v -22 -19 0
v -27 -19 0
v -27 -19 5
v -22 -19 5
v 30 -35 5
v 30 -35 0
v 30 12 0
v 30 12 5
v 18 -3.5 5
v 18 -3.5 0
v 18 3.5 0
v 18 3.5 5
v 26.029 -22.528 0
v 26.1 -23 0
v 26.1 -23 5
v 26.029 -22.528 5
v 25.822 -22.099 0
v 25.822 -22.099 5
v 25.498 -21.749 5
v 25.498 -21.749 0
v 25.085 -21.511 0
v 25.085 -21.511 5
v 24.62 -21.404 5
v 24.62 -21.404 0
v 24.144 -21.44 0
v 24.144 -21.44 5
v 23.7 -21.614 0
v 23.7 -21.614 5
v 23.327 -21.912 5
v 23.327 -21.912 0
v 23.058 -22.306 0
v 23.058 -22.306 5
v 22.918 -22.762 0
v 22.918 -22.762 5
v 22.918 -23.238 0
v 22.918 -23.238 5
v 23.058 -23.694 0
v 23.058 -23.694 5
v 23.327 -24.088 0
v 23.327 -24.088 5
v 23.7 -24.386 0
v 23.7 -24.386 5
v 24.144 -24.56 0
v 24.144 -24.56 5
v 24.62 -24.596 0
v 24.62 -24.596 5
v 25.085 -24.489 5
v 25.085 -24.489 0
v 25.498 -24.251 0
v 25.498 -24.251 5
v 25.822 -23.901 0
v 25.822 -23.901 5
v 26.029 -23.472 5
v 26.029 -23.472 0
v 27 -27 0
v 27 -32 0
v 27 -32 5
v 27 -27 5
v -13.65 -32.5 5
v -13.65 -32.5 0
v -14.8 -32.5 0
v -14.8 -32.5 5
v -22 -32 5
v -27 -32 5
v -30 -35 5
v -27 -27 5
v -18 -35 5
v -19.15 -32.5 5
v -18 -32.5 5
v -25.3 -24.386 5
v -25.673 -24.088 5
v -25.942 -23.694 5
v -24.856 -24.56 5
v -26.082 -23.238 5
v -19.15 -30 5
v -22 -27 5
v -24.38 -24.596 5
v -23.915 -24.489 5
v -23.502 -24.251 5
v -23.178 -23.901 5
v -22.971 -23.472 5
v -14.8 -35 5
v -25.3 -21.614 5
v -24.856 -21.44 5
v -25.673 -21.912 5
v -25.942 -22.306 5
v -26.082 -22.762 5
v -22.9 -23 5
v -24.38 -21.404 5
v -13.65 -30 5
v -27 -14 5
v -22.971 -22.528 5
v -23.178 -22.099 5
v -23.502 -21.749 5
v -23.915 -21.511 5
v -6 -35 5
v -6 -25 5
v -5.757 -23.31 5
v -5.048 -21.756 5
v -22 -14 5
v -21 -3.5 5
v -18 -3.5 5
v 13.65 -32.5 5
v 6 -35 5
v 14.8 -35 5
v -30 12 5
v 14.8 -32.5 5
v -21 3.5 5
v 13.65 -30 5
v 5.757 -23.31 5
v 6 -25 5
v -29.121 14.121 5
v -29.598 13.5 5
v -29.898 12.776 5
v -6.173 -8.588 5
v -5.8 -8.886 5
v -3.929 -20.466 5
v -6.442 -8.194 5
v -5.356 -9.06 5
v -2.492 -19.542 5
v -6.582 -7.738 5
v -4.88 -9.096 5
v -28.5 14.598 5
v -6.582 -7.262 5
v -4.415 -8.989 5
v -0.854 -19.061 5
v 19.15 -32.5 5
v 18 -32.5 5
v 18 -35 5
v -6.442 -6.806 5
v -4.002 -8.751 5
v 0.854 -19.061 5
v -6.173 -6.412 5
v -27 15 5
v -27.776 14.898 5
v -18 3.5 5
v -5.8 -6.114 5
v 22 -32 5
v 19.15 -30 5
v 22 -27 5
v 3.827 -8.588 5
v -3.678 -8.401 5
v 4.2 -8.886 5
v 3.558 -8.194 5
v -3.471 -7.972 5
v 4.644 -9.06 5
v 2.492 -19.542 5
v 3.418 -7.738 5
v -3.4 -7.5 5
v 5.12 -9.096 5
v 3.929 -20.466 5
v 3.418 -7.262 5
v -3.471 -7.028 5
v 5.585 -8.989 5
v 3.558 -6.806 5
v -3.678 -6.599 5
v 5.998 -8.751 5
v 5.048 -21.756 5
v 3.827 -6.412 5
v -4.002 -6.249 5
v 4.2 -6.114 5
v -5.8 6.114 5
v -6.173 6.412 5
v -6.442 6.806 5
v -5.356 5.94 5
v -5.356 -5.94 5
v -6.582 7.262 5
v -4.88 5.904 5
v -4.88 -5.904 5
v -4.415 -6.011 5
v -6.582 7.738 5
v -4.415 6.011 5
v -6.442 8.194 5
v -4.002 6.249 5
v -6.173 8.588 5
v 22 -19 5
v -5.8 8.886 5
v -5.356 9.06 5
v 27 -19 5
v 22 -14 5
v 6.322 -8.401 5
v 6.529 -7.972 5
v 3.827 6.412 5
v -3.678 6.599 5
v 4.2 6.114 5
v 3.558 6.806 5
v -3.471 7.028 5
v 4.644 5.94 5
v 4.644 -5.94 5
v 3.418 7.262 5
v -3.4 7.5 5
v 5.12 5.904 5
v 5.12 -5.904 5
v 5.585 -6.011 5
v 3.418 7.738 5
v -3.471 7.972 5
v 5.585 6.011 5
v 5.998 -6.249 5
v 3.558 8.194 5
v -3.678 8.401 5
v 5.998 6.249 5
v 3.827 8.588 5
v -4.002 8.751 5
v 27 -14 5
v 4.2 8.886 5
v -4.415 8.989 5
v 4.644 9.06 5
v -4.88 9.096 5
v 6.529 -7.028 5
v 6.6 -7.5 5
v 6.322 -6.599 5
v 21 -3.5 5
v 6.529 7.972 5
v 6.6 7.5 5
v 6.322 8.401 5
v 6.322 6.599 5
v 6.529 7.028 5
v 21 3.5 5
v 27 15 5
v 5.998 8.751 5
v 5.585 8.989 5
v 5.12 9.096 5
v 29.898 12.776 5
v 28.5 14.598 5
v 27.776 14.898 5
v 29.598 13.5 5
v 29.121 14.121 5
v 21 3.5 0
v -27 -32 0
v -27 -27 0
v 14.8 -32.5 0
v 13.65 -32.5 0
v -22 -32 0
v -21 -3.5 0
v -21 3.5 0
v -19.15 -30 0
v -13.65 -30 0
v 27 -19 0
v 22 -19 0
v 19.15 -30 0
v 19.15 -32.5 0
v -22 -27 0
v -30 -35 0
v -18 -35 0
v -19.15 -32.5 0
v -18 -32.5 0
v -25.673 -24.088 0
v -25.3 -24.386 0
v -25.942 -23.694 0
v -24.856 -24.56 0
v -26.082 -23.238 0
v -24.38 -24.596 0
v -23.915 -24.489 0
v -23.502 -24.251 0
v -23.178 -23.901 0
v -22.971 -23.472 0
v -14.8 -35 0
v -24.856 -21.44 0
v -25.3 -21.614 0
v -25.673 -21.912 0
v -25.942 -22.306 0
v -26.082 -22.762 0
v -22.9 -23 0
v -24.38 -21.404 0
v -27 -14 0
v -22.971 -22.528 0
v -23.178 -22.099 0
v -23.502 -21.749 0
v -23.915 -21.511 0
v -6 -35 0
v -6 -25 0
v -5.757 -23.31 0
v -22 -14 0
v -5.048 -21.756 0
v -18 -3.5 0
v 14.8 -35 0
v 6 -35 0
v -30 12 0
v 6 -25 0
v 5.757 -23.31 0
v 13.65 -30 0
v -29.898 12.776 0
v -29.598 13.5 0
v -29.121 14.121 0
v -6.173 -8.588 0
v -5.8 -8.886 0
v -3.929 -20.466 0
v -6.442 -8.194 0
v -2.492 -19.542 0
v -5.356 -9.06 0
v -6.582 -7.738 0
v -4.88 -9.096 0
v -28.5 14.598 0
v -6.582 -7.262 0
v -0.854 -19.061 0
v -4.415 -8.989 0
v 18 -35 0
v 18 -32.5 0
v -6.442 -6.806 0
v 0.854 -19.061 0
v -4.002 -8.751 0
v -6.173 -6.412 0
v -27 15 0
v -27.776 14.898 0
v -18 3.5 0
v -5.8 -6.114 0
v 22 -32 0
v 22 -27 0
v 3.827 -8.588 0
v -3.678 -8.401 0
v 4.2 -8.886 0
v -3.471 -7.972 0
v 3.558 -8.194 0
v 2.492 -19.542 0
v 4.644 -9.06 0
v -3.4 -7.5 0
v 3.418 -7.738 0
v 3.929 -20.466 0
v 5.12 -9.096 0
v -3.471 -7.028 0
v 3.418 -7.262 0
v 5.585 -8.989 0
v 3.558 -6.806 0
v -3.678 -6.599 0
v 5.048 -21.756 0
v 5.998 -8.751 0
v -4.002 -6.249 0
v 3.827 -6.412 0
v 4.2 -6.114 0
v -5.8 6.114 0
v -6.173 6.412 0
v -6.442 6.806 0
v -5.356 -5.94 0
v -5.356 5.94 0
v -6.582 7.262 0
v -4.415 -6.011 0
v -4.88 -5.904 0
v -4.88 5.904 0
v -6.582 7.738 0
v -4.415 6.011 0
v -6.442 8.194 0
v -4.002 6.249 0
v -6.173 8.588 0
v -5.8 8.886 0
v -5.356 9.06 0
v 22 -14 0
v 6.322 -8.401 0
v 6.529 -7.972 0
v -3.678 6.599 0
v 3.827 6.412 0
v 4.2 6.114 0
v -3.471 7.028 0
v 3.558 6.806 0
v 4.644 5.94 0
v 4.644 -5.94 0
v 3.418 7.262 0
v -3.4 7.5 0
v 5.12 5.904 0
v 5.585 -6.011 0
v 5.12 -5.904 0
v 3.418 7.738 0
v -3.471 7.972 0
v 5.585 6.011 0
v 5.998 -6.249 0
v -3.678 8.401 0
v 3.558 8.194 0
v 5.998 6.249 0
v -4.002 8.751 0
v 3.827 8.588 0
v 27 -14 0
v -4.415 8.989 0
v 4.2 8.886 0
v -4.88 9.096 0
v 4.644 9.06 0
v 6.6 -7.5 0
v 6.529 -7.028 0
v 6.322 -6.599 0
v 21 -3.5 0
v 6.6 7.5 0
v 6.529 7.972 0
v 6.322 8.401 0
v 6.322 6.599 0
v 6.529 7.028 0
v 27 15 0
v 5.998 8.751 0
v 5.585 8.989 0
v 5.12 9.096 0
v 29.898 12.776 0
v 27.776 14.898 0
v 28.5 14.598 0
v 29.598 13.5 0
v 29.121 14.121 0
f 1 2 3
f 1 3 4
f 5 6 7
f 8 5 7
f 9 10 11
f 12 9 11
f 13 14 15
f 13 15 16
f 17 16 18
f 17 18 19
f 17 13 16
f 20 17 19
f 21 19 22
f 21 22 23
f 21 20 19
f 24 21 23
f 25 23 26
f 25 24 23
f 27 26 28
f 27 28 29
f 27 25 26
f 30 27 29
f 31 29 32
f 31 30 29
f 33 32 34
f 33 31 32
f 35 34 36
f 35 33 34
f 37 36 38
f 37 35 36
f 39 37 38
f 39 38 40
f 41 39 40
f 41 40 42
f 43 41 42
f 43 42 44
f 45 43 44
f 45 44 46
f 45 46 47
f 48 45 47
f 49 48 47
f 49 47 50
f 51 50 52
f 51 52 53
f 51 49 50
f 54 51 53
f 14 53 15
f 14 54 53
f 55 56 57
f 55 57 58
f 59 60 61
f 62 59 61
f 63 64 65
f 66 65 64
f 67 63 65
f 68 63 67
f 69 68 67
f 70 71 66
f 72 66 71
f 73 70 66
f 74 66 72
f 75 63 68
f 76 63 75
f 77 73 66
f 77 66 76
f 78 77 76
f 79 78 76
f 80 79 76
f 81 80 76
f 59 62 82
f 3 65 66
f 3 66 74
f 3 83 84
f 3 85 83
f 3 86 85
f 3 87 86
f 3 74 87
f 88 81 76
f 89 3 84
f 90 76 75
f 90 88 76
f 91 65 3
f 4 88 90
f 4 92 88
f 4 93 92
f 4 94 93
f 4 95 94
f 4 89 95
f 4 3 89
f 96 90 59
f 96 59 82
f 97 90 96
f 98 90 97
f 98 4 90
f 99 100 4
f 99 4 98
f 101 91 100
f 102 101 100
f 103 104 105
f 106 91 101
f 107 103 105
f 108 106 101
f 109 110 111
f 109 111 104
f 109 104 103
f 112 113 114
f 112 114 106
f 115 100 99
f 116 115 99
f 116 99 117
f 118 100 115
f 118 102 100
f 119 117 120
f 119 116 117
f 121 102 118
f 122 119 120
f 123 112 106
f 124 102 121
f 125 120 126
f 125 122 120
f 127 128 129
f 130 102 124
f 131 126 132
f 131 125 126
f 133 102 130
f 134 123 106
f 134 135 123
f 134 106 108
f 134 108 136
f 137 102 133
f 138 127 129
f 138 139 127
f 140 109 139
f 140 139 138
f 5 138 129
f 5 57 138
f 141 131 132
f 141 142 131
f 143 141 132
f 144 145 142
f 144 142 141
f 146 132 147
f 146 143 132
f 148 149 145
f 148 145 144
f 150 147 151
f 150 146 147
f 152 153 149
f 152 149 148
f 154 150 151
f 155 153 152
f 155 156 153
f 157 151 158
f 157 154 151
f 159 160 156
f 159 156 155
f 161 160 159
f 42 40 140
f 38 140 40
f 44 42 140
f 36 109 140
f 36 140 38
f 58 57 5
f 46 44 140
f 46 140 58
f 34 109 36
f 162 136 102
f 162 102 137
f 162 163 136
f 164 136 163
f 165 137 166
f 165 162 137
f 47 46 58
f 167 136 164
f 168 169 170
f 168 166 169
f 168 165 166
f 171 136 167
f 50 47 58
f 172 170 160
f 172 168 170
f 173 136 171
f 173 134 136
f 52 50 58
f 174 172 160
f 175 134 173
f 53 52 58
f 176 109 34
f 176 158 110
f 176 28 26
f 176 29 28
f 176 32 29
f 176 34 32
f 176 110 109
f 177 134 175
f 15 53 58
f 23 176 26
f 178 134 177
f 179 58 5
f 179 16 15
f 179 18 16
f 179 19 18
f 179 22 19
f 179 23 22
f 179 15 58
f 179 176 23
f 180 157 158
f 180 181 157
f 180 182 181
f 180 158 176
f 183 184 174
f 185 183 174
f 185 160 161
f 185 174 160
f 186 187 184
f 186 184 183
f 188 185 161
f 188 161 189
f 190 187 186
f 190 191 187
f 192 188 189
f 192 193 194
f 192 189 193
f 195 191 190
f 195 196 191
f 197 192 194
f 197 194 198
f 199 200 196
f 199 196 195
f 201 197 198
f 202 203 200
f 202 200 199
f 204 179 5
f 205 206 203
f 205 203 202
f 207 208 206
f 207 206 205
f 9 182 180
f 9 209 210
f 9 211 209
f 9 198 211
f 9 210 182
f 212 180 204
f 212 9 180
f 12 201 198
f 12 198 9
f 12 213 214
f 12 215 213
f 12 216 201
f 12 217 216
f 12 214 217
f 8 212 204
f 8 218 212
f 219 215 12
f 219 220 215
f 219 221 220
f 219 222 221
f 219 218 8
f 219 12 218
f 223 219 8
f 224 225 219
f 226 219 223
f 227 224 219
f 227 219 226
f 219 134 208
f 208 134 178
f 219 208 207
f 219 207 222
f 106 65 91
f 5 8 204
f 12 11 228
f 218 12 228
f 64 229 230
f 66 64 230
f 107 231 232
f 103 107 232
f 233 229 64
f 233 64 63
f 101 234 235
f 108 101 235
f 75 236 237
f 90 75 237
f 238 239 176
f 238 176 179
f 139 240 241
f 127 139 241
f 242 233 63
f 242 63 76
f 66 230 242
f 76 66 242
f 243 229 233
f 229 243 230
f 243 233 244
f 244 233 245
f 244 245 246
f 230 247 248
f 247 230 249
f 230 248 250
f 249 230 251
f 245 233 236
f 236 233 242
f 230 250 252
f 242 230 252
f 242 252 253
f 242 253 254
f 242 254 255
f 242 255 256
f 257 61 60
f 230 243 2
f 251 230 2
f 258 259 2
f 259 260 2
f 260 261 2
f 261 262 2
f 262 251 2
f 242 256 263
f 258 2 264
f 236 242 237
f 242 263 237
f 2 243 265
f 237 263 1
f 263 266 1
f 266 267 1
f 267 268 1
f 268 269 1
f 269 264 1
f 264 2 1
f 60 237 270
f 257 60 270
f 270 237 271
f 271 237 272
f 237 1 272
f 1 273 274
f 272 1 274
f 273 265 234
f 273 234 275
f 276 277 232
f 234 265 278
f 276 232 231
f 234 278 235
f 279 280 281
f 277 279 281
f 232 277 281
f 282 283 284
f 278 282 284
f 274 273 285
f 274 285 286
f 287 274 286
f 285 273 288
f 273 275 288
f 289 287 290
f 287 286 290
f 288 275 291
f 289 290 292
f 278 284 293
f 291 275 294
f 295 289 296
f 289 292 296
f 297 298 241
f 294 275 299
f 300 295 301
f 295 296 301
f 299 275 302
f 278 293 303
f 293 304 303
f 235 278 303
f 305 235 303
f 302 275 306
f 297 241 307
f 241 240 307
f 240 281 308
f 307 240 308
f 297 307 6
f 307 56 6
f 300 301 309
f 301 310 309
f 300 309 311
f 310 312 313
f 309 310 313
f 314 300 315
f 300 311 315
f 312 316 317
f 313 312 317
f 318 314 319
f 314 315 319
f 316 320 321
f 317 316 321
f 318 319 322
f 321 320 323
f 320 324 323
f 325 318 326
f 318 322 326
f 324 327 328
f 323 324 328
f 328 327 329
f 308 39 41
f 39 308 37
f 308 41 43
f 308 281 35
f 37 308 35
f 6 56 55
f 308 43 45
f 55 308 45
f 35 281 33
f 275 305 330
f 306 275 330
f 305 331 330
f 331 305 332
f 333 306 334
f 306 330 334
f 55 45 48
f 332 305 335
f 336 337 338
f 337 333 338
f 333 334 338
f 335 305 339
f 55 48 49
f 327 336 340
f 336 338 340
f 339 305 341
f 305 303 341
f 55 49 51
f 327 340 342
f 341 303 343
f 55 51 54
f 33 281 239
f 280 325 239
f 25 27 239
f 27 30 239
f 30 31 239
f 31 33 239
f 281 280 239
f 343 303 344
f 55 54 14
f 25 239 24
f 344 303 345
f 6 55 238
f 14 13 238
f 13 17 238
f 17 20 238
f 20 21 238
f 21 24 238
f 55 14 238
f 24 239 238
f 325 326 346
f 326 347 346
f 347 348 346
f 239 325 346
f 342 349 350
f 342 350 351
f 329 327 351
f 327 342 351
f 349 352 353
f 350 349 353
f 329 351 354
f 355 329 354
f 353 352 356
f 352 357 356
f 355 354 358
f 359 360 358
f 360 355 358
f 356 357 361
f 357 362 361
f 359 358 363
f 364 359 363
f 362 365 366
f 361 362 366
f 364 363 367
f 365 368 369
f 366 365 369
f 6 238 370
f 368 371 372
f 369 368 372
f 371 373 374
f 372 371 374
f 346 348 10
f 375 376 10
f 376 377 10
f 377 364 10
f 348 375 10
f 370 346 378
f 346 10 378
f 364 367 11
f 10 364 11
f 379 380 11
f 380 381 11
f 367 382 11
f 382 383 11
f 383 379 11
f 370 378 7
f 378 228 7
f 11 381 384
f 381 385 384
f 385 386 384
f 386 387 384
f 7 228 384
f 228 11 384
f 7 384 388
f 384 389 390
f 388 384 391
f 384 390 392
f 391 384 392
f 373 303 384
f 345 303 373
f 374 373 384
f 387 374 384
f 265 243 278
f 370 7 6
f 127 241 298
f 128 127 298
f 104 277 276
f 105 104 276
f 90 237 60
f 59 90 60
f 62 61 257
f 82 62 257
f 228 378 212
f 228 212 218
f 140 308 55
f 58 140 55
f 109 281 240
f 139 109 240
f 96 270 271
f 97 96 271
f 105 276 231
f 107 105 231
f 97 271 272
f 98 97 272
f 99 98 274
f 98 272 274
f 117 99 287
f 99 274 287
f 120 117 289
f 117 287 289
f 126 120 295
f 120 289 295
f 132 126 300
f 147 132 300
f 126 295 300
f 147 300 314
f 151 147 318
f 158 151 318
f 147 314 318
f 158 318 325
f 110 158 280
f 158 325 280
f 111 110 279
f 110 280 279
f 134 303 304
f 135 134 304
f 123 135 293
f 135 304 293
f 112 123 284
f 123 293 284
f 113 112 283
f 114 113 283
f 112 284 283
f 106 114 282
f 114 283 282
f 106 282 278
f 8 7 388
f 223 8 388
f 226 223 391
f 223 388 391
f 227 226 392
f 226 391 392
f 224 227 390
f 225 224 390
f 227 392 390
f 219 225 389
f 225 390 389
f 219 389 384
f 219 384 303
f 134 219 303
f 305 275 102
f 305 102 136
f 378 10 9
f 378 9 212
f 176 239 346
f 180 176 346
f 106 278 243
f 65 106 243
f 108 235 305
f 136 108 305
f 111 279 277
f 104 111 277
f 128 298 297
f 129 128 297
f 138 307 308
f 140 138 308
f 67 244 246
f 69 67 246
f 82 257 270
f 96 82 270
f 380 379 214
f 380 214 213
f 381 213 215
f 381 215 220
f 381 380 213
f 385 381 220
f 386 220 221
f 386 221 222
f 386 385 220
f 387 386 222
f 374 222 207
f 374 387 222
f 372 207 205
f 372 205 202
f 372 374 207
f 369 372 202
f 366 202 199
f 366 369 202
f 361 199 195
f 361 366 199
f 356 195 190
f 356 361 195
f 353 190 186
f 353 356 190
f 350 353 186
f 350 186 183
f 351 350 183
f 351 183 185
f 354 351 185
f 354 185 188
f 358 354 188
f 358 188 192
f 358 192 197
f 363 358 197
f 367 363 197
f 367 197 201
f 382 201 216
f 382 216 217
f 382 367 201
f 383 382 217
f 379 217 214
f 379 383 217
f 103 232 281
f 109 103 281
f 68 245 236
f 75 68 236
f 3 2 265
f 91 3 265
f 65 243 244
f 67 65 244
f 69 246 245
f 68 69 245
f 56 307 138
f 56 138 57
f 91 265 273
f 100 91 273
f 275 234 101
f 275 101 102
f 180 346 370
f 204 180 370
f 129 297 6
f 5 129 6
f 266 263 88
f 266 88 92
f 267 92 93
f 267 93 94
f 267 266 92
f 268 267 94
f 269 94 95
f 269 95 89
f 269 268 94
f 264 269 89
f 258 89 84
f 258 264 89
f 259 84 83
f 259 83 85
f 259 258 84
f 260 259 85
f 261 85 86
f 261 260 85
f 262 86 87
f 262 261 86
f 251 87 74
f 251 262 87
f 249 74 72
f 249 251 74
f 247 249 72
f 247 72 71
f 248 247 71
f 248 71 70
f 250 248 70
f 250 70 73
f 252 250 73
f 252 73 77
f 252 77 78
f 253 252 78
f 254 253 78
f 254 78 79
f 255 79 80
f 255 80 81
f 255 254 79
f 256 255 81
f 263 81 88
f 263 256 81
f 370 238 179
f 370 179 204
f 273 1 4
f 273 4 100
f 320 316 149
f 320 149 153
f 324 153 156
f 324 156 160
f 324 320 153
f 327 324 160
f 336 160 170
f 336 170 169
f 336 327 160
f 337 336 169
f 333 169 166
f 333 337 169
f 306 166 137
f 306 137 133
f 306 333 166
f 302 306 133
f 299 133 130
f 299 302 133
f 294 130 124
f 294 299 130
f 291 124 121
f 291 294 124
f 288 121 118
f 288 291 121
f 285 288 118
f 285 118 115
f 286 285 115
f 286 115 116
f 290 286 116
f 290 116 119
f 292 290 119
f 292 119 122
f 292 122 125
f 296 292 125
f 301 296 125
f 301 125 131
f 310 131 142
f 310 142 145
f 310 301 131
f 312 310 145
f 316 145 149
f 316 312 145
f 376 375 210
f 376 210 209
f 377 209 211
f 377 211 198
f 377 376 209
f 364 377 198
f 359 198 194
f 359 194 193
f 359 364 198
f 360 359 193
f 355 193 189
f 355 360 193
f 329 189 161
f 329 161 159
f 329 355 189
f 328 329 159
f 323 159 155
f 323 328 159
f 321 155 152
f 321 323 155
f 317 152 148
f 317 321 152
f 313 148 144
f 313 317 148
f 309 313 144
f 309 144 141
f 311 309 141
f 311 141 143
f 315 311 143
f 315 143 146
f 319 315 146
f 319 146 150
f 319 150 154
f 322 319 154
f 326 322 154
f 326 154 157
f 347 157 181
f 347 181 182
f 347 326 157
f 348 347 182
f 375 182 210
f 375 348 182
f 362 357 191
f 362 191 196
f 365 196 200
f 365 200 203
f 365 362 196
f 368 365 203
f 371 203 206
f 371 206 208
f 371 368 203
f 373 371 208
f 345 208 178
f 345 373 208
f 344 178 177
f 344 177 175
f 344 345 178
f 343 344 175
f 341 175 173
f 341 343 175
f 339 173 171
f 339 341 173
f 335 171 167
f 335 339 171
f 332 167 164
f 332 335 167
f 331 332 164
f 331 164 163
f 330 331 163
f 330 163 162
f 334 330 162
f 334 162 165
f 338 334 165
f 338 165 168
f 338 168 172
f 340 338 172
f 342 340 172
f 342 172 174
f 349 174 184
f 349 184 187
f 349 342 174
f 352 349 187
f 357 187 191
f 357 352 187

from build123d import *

# Parameters (mm, degrees)
F1_W     = 5
F1_H     = 5
F1_R     = 1.6
F1_W_2   = 3
F1_H_2   = 7
F2_DEPTH = 5


with BuildPart() as f2:
    # F1 (on Top) → F2 (new body)
    with BuildSketch(Plane.XY):
        with BuildLine():
            ThreePointArc((30, 12), (29.1213203436, 14.1213203436), (27, 15))
            Line((27, 15), (-27, 15))
            ThreePointArc((-27, 15), (-29.1213203436, 14.1213203436), (-30, 12))
            Line((-30, 12), (-30, -35))
            Line((-30, -35), (-18, -35))
            Line((-18, -35), (-18, -32.5))
            Line((-18, -32.5), (-19.15, -32.5))
            Line((-19.15, -32.5), (-19.15, -30))
            Line((-19.15, -30), (-16.4, -30))
            Line((-16.4, -30), (-13.65, -30))
            Line((-13.65, -30), (-13.65, -32.5))
            Line((-13.65, -32.5), (-14.8, -32.5))
            Line((-14.8, -32.5), (-14.8, -35))
            Line((-14.8, -35), (-6, -35))
            Line((-6, -35), (-6, -25))
            ThreePointArc((-6, -25), (0, -19), (6, -25))
            Line((6, -25), (6, -35))
            Line((6, -35), (14.8, -35))
            Line((14.8, -35), (14.8, -32.5))
            Line((14.8, -32.5), (13.65, -32.5))
            Line((13.65, -32.5), (13.65, -30))
            Line((13.65, -30), (16.4, -30))
            Line((16.4, -30), (19.15, -30))
            Line((19.15, -30), (19.15, -32.5))
            Line((19.15, -32.5), (18, -32.5))
            Line((18, -32.5), (18, -35))
            Line((18, -35), (30, -35))
            Line((30, -35), (30, 12))
        make_face()
        with Locations((-24.5, -29.5)):
            Rectangle(F1_W, F1_H, mode=Mode.SUBTRACT)
        with Locations((-24.5, -23)):
            Circle(F1_R, mode=Mode.SUBTRACT)
        with Locations((-24.5, -16.5)):
            Rectangle(F1_W, F1_H, mode=Mode.SUBTRACT)
        with Locations((24.5, -29.5)):
            Rectangle(F1_W, F1_H, mode=Mode.SUBTRACT)
        with Locations((24.5, -23)):
            Circle(F1_R, mode=Mode.SUBTRACT)
        with Locations((24.5, -16.5)):
            Rectangle(F1_W, F1_H, mode=Mode.SUBTRACT)
        with Locations((-19.5, 0)):
            Rectangle(F1_W_2, F1_H_2, mode=Mode.SUBTRACT)
        with Locations((-5, -7.5)):
            Circle(F1_R, mode=Mode.SUBTRACT)
        with Locations((-5, 7.5)):
            Circle(F1_R, mode=Mode.SUBTRACT)
        with Locations((5, -7.5)):
            Circle(F1_R, mode=Mode.SUBTRACT)
        with Locations((19.5, 0)):
            Rectangle(F1_W_2, F1_H_2, mode=Mode.SUBTRACT)
        with Locations((5, 7.5)):
            Circle(F1_R, mode=Mode.SUBTRACT)
    extrude(amount=F2_DEPTH)


solid = f2.part
